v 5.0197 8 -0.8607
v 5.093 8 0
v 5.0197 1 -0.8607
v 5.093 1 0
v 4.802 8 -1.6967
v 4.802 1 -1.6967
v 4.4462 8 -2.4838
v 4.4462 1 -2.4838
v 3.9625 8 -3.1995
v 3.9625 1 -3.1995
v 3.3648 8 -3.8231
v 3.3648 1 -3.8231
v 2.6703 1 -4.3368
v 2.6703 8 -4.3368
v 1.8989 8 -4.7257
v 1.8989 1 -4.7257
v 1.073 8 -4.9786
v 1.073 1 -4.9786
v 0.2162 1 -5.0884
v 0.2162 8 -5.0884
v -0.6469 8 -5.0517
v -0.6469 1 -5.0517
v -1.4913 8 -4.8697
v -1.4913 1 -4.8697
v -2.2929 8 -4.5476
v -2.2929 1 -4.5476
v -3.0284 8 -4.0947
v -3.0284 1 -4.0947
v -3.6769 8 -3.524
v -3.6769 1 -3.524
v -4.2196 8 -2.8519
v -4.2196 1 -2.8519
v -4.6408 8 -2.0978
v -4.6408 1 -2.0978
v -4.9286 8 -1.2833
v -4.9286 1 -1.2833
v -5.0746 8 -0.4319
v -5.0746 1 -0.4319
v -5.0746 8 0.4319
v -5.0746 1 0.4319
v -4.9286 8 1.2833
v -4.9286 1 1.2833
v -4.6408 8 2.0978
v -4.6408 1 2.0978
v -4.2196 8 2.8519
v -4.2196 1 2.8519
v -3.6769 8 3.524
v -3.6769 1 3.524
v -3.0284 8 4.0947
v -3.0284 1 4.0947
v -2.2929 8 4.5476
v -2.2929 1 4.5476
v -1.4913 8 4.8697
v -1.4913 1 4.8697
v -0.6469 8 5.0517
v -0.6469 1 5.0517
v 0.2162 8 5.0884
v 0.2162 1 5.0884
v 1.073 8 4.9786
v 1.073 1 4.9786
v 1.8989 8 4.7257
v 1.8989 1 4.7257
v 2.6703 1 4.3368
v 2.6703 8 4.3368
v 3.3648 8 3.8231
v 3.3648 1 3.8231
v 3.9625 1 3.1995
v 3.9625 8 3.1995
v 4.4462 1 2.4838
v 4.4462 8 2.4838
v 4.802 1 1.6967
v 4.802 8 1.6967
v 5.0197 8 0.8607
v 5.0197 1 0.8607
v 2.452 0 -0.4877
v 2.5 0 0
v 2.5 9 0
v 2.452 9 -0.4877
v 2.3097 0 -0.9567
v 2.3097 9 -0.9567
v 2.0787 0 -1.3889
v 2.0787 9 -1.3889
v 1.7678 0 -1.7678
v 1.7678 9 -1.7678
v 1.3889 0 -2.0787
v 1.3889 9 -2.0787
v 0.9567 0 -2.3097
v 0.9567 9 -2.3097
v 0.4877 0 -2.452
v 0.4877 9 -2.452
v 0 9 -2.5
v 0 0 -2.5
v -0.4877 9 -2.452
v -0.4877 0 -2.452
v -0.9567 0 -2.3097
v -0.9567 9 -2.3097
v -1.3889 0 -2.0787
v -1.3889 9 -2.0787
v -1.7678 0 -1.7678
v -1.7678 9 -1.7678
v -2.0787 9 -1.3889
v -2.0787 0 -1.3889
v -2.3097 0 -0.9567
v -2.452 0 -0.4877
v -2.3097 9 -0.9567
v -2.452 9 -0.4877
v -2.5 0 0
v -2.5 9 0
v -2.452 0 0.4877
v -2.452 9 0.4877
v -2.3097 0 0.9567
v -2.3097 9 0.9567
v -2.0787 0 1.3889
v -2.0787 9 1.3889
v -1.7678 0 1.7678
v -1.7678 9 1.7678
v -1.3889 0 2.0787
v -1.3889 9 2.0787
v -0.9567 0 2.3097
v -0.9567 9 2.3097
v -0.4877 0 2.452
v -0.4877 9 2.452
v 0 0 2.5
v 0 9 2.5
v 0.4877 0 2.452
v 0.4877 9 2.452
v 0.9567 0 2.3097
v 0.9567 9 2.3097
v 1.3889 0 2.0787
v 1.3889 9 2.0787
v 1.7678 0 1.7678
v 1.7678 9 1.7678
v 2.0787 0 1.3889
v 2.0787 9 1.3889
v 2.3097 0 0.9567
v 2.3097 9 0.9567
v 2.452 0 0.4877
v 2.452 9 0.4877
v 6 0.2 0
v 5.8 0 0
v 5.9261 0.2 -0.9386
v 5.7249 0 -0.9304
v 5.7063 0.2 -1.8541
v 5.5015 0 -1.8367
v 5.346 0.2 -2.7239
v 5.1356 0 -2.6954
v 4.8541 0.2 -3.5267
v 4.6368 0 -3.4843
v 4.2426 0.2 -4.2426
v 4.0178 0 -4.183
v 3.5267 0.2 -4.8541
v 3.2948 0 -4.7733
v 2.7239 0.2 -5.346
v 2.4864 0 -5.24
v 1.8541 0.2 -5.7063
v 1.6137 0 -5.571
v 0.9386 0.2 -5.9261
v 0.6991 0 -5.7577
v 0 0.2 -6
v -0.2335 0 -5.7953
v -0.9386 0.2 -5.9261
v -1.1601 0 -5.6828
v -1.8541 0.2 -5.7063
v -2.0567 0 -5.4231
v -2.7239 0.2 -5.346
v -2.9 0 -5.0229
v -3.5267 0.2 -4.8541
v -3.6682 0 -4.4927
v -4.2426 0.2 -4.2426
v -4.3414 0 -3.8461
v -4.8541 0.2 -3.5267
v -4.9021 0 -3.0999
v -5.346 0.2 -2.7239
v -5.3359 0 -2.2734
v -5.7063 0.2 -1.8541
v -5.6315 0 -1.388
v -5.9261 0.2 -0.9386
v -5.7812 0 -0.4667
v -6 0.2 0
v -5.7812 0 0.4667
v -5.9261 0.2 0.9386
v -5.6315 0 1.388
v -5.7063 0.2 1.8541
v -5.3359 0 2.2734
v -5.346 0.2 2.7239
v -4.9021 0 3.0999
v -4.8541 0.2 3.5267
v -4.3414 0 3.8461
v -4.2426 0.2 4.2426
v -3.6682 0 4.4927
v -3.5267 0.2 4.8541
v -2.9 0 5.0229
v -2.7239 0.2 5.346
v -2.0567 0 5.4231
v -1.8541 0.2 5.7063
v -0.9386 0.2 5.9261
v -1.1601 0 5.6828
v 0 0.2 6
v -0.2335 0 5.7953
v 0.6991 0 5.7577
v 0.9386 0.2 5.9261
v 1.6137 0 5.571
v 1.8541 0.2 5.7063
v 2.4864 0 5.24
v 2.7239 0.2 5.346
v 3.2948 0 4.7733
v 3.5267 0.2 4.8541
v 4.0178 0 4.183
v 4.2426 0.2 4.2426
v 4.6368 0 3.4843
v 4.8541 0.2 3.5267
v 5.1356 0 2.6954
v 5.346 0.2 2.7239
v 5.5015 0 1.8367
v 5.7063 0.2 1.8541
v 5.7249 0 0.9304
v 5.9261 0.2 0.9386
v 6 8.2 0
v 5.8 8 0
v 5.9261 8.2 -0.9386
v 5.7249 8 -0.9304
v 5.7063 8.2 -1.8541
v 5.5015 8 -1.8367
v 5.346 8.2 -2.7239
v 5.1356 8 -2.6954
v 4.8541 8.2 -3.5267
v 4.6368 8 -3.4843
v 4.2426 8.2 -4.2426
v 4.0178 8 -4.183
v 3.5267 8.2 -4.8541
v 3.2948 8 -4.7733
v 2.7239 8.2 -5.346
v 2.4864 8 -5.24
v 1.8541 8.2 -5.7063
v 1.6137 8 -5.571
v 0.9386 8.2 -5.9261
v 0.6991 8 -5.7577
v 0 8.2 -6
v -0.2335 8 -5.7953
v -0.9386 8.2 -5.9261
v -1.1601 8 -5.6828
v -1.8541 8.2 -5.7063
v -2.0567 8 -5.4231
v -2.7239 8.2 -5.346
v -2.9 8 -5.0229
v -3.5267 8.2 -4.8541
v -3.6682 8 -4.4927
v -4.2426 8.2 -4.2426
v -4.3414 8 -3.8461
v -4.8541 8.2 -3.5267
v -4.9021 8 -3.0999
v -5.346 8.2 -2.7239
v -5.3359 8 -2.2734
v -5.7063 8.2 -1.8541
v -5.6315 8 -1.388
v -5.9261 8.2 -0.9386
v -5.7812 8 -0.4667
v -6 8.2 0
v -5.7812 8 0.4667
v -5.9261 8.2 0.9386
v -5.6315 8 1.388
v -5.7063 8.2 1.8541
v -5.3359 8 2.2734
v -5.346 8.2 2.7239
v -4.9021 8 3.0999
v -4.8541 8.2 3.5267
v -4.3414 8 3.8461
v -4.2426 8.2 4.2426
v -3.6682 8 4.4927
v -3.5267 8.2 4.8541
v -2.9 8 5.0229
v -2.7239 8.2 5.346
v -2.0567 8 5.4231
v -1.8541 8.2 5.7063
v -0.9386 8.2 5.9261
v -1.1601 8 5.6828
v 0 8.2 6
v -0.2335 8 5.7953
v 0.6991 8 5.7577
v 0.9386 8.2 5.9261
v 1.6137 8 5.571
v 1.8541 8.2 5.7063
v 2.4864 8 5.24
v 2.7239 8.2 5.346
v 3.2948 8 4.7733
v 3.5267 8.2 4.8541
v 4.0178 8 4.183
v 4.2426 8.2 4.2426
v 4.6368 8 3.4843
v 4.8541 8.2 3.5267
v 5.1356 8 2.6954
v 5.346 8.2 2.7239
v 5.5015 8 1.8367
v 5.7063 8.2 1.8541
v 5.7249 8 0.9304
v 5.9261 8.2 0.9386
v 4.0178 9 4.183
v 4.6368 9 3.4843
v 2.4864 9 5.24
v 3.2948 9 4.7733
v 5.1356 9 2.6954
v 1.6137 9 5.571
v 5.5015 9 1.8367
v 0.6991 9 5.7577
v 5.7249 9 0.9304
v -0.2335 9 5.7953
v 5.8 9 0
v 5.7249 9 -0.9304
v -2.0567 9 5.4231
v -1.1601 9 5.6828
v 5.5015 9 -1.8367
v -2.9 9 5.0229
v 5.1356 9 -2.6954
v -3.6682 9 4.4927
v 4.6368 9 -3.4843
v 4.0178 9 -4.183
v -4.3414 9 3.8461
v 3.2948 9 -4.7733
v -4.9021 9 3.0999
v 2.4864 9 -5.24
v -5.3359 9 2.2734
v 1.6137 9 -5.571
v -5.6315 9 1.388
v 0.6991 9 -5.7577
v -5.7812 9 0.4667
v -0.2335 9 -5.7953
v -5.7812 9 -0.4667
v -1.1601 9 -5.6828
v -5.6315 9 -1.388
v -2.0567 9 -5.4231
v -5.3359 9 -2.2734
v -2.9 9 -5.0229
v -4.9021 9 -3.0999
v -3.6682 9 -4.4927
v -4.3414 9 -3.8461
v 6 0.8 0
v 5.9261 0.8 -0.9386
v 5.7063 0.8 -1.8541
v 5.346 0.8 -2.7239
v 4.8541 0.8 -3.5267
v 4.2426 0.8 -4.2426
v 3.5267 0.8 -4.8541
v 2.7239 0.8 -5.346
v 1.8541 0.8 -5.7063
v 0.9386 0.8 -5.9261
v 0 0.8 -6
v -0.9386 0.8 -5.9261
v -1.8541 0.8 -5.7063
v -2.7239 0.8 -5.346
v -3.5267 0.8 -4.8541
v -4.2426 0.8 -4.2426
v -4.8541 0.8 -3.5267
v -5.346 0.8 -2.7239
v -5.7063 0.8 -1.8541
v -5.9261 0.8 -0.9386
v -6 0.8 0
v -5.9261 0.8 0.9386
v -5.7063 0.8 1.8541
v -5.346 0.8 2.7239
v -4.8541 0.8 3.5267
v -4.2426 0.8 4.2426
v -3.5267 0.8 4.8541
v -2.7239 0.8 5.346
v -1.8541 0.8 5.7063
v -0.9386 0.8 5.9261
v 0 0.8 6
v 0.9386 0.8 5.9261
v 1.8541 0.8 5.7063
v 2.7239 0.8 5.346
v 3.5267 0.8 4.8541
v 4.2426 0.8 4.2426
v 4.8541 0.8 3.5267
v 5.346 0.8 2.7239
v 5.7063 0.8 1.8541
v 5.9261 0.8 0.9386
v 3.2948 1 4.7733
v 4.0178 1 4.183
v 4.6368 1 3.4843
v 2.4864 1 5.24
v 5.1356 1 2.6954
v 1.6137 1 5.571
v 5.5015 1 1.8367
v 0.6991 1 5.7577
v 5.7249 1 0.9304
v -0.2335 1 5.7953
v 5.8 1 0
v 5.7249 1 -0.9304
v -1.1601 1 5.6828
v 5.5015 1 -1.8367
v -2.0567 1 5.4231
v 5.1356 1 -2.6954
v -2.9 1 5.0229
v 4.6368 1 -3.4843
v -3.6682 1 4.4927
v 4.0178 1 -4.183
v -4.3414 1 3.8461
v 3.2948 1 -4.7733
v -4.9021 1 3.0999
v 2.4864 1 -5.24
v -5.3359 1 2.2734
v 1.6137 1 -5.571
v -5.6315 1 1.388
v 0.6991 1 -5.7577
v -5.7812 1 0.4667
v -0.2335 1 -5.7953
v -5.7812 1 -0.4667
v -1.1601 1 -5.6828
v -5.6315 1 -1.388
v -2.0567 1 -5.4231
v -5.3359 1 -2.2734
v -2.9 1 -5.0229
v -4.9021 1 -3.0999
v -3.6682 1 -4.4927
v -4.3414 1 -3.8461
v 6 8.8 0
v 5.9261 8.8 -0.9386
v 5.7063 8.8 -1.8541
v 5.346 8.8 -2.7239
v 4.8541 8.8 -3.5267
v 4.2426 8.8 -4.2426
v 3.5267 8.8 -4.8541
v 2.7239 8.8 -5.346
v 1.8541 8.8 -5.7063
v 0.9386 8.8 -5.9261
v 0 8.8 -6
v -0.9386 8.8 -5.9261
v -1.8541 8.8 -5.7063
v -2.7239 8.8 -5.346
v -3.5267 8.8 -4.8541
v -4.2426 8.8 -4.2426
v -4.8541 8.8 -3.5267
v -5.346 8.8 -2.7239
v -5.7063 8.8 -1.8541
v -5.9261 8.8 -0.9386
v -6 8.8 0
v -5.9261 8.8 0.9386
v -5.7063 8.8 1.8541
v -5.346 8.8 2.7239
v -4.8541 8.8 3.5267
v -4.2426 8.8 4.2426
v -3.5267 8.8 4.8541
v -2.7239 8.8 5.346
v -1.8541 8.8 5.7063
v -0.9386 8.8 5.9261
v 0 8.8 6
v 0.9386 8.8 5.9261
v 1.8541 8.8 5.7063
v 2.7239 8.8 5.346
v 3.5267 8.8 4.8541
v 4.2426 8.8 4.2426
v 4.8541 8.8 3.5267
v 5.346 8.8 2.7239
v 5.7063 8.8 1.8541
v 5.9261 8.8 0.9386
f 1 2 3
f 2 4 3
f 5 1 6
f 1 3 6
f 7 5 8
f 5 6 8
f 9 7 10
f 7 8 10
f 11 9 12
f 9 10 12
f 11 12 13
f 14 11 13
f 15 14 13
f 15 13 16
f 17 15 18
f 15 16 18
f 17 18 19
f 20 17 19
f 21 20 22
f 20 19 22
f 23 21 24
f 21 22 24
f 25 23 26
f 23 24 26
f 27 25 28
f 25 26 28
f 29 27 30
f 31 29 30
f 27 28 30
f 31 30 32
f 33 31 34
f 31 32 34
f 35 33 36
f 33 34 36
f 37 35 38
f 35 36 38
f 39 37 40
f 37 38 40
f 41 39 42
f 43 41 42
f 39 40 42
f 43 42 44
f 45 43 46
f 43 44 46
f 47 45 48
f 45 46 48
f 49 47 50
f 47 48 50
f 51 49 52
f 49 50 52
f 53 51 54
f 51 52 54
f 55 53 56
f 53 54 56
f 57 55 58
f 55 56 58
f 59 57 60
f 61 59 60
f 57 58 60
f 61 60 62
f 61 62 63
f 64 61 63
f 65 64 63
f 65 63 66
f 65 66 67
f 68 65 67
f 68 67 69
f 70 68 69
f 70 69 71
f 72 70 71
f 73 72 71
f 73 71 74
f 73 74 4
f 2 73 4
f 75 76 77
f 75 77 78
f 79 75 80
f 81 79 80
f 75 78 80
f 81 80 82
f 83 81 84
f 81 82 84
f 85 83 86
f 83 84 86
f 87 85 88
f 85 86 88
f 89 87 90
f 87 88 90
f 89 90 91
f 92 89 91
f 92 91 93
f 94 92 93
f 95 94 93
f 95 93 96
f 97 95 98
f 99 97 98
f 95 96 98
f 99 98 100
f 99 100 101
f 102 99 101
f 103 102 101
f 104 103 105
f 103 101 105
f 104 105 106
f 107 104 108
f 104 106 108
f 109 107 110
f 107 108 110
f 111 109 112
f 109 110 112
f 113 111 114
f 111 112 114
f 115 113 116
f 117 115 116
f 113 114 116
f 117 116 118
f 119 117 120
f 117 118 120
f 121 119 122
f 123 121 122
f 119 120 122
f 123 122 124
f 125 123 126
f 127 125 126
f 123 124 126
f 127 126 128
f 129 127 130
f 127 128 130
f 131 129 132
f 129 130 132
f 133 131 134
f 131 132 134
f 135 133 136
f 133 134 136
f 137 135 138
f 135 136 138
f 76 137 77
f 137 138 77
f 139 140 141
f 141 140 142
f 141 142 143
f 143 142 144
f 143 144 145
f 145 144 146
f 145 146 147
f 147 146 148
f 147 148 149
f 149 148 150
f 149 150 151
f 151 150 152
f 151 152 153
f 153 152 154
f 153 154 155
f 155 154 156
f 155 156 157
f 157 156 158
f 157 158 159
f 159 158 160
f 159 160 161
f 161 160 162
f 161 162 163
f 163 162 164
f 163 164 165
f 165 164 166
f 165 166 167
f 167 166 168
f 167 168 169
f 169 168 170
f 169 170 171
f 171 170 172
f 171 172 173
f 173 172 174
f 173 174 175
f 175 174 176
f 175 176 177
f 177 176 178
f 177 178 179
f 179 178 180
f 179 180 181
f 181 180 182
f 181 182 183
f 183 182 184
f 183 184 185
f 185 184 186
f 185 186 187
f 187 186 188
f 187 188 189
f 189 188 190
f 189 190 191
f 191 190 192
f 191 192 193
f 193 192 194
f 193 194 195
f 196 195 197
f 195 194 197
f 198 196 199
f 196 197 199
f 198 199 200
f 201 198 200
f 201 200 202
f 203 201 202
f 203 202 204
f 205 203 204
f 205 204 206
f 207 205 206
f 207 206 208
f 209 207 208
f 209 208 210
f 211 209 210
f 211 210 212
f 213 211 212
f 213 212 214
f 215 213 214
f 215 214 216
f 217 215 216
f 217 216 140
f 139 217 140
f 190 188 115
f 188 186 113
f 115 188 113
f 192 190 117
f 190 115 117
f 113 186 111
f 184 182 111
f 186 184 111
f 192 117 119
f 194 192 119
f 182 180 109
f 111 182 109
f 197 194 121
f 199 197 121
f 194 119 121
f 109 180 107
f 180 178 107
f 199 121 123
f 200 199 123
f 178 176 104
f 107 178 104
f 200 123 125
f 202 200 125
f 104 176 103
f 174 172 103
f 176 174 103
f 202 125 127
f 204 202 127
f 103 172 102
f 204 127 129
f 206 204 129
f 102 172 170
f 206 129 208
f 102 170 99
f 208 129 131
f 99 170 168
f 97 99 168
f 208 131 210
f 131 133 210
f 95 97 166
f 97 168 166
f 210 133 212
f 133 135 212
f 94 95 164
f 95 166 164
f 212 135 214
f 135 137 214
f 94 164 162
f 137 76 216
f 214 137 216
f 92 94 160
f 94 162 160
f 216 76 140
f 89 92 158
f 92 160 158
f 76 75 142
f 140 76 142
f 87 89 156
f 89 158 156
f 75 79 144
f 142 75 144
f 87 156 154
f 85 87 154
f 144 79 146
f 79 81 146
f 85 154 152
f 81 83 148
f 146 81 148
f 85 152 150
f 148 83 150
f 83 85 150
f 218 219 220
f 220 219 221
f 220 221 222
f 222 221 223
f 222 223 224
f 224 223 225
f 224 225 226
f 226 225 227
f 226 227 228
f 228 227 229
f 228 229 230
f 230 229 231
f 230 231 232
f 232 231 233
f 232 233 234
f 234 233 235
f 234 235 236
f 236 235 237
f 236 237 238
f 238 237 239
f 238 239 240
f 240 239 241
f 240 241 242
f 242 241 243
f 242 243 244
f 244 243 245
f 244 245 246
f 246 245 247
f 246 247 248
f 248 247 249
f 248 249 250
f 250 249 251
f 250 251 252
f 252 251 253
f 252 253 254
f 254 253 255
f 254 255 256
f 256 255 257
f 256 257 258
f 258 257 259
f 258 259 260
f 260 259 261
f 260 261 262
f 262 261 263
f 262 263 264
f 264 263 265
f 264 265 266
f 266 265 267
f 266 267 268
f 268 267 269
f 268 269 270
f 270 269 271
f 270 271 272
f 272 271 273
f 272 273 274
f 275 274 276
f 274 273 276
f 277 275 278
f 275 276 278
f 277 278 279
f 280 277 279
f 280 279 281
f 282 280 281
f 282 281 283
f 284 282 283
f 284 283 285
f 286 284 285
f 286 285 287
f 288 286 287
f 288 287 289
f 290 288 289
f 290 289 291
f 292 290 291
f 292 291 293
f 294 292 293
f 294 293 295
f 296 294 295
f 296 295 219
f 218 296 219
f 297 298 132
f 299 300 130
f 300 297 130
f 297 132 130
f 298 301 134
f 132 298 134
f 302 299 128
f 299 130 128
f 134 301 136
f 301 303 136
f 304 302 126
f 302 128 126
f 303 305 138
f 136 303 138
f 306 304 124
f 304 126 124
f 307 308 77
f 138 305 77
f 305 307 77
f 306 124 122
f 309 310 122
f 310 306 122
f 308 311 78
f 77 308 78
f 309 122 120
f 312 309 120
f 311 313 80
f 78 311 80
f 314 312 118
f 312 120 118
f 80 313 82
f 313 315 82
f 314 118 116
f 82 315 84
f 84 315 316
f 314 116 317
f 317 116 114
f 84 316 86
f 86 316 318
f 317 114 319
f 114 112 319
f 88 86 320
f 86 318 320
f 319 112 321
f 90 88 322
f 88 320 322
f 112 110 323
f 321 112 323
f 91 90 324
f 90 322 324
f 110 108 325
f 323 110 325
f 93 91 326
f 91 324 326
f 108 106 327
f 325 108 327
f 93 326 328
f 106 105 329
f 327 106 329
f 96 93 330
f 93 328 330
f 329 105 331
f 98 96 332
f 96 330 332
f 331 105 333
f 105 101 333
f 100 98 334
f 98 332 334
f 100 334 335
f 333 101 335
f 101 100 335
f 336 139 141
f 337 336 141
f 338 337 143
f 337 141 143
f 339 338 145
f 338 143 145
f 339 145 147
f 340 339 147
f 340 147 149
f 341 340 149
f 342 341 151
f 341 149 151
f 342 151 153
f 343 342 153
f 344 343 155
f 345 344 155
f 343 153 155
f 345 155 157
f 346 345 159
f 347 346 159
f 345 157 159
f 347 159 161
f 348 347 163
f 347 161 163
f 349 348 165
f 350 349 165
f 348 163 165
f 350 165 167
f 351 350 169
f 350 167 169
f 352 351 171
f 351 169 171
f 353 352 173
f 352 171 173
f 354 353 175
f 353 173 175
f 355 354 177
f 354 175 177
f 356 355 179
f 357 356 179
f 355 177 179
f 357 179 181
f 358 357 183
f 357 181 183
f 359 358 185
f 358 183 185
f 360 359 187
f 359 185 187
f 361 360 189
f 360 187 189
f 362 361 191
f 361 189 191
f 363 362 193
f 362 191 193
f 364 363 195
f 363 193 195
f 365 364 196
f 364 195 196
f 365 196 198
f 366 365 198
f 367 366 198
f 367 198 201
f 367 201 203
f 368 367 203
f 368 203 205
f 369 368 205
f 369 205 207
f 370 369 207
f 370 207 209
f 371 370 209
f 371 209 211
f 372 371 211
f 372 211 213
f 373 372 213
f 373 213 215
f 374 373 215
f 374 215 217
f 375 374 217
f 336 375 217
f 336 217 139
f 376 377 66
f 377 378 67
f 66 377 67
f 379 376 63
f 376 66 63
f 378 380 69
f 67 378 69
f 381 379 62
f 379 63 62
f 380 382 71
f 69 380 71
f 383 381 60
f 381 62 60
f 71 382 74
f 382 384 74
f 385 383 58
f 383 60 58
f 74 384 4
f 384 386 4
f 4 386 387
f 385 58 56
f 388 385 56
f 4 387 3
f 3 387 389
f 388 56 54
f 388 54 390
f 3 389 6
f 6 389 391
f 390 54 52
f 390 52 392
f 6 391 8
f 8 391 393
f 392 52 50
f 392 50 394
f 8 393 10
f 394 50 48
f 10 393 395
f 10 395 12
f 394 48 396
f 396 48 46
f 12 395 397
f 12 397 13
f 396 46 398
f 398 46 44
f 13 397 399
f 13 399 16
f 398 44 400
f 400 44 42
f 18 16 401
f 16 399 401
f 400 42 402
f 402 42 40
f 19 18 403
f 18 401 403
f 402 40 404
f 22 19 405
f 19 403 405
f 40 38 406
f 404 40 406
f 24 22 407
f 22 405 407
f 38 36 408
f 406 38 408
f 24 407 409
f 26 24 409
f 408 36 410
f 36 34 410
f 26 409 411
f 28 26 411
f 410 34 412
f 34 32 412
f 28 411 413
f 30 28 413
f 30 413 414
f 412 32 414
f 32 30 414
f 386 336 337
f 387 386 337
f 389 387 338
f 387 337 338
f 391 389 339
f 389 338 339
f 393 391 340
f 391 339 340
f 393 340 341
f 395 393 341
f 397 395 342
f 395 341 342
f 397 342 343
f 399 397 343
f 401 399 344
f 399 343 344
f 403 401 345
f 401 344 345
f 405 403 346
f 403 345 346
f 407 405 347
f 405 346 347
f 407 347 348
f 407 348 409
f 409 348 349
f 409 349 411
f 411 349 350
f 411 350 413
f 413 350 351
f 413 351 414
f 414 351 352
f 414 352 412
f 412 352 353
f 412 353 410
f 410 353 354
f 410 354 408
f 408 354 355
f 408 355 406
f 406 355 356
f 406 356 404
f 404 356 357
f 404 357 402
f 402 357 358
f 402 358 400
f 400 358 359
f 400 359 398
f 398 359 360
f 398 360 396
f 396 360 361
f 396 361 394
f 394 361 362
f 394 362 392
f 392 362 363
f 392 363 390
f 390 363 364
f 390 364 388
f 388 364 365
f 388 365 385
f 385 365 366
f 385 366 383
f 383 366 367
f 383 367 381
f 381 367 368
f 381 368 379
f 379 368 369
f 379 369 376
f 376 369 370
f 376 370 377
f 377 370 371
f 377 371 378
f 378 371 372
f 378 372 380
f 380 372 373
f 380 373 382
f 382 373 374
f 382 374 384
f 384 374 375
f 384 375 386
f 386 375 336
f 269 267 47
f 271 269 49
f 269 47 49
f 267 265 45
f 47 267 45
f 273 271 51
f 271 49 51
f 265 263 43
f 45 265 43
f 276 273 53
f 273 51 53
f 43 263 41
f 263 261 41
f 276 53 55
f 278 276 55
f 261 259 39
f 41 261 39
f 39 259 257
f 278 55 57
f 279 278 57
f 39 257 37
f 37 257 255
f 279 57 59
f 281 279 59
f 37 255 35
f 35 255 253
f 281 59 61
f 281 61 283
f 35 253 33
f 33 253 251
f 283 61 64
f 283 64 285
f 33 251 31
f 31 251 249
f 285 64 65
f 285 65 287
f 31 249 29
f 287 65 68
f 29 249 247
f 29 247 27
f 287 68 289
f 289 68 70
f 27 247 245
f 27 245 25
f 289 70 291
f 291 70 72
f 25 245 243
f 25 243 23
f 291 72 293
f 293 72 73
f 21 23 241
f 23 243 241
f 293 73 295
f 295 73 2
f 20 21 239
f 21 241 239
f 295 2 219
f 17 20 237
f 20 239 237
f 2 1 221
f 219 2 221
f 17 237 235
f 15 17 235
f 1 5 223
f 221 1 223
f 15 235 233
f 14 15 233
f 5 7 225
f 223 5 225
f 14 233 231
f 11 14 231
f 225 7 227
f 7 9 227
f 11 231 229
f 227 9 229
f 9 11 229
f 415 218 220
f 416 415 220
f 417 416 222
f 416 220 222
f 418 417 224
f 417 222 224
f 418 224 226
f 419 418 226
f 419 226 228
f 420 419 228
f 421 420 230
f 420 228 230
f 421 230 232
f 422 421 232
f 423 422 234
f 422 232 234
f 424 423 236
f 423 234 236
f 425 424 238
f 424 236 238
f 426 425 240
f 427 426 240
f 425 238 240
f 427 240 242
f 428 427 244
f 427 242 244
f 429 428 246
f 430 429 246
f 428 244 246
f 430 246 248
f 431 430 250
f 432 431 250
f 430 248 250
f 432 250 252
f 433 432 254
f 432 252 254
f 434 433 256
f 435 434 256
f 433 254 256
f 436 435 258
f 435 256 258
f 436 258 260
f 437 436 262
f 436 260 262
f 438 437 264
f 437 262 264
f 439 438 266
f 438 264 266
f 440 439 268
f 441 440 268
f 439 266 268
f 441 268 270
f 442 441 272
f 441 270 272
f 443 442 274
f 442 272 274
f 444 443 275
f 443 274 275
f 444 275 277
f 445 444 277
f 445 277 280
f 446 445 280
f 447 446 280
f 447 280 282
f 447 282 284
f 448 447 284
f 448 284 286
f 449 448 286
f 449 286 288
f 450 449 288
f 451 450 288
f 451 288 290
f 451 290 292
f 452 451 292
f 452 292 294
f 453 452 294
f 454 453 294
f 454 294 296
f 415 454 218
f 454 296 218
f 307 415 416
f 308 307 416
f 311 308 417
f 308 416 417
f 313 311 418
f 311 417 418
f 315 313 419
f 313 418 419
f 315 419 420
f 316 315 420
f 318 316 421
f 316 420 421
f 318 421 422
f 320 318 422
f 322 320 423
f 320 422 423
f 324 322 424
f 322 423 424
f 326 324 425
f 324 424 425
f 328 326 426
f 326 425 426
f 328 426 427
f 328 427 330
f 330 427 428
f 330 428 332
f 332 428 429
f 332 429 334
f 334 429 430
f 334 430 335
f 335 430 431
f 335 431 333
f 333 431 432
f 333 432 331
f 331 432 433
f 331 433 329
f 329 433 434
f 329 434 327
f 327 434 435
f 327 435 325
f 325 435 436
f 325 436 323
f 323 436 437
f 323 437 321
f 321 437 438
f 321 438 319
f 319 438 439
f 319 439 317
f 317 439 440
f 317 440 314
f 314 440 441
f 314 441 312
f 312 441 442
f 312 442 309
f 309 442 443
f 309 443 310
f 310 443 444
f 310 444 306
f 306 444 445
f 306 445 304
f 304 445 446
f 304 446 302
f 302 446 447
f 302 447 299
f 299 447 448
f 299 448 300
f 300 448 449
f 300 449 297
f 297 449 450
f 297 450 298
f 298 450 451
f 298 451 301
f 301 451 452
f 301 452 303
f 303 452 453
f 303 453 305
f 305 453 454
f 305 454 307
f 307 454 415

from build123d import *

# Parameters (mm, degrees)
CHAMFER1_SIZE = 0.2


with BuildPart() as part:
    # Sketch1 → Revolve1 (revolve)
    with BuildSketch(Plane.XY):
        Polygon((2.5, 0), (2.5, 9), (6, 9), (6, 8), (5.092958179, 8), (5.092958179, 1), (6, 1), (6, 0), align=None)
    revolve(axis=Axis((0, 0, 0), (0, 1, 0)))

    # Chamfer1
    chamfer1_edges = [part.edges().sort_by_distance(p)[0] for p in [
        (-6, 0, 0),
        (-6, 1, 0),
        (-6, 8, 0),
        (-6, 9, 0),
    ]]
    chamfer(chamfer1_edges, length=CHAMFER1_SIZE)


solid = part.part
